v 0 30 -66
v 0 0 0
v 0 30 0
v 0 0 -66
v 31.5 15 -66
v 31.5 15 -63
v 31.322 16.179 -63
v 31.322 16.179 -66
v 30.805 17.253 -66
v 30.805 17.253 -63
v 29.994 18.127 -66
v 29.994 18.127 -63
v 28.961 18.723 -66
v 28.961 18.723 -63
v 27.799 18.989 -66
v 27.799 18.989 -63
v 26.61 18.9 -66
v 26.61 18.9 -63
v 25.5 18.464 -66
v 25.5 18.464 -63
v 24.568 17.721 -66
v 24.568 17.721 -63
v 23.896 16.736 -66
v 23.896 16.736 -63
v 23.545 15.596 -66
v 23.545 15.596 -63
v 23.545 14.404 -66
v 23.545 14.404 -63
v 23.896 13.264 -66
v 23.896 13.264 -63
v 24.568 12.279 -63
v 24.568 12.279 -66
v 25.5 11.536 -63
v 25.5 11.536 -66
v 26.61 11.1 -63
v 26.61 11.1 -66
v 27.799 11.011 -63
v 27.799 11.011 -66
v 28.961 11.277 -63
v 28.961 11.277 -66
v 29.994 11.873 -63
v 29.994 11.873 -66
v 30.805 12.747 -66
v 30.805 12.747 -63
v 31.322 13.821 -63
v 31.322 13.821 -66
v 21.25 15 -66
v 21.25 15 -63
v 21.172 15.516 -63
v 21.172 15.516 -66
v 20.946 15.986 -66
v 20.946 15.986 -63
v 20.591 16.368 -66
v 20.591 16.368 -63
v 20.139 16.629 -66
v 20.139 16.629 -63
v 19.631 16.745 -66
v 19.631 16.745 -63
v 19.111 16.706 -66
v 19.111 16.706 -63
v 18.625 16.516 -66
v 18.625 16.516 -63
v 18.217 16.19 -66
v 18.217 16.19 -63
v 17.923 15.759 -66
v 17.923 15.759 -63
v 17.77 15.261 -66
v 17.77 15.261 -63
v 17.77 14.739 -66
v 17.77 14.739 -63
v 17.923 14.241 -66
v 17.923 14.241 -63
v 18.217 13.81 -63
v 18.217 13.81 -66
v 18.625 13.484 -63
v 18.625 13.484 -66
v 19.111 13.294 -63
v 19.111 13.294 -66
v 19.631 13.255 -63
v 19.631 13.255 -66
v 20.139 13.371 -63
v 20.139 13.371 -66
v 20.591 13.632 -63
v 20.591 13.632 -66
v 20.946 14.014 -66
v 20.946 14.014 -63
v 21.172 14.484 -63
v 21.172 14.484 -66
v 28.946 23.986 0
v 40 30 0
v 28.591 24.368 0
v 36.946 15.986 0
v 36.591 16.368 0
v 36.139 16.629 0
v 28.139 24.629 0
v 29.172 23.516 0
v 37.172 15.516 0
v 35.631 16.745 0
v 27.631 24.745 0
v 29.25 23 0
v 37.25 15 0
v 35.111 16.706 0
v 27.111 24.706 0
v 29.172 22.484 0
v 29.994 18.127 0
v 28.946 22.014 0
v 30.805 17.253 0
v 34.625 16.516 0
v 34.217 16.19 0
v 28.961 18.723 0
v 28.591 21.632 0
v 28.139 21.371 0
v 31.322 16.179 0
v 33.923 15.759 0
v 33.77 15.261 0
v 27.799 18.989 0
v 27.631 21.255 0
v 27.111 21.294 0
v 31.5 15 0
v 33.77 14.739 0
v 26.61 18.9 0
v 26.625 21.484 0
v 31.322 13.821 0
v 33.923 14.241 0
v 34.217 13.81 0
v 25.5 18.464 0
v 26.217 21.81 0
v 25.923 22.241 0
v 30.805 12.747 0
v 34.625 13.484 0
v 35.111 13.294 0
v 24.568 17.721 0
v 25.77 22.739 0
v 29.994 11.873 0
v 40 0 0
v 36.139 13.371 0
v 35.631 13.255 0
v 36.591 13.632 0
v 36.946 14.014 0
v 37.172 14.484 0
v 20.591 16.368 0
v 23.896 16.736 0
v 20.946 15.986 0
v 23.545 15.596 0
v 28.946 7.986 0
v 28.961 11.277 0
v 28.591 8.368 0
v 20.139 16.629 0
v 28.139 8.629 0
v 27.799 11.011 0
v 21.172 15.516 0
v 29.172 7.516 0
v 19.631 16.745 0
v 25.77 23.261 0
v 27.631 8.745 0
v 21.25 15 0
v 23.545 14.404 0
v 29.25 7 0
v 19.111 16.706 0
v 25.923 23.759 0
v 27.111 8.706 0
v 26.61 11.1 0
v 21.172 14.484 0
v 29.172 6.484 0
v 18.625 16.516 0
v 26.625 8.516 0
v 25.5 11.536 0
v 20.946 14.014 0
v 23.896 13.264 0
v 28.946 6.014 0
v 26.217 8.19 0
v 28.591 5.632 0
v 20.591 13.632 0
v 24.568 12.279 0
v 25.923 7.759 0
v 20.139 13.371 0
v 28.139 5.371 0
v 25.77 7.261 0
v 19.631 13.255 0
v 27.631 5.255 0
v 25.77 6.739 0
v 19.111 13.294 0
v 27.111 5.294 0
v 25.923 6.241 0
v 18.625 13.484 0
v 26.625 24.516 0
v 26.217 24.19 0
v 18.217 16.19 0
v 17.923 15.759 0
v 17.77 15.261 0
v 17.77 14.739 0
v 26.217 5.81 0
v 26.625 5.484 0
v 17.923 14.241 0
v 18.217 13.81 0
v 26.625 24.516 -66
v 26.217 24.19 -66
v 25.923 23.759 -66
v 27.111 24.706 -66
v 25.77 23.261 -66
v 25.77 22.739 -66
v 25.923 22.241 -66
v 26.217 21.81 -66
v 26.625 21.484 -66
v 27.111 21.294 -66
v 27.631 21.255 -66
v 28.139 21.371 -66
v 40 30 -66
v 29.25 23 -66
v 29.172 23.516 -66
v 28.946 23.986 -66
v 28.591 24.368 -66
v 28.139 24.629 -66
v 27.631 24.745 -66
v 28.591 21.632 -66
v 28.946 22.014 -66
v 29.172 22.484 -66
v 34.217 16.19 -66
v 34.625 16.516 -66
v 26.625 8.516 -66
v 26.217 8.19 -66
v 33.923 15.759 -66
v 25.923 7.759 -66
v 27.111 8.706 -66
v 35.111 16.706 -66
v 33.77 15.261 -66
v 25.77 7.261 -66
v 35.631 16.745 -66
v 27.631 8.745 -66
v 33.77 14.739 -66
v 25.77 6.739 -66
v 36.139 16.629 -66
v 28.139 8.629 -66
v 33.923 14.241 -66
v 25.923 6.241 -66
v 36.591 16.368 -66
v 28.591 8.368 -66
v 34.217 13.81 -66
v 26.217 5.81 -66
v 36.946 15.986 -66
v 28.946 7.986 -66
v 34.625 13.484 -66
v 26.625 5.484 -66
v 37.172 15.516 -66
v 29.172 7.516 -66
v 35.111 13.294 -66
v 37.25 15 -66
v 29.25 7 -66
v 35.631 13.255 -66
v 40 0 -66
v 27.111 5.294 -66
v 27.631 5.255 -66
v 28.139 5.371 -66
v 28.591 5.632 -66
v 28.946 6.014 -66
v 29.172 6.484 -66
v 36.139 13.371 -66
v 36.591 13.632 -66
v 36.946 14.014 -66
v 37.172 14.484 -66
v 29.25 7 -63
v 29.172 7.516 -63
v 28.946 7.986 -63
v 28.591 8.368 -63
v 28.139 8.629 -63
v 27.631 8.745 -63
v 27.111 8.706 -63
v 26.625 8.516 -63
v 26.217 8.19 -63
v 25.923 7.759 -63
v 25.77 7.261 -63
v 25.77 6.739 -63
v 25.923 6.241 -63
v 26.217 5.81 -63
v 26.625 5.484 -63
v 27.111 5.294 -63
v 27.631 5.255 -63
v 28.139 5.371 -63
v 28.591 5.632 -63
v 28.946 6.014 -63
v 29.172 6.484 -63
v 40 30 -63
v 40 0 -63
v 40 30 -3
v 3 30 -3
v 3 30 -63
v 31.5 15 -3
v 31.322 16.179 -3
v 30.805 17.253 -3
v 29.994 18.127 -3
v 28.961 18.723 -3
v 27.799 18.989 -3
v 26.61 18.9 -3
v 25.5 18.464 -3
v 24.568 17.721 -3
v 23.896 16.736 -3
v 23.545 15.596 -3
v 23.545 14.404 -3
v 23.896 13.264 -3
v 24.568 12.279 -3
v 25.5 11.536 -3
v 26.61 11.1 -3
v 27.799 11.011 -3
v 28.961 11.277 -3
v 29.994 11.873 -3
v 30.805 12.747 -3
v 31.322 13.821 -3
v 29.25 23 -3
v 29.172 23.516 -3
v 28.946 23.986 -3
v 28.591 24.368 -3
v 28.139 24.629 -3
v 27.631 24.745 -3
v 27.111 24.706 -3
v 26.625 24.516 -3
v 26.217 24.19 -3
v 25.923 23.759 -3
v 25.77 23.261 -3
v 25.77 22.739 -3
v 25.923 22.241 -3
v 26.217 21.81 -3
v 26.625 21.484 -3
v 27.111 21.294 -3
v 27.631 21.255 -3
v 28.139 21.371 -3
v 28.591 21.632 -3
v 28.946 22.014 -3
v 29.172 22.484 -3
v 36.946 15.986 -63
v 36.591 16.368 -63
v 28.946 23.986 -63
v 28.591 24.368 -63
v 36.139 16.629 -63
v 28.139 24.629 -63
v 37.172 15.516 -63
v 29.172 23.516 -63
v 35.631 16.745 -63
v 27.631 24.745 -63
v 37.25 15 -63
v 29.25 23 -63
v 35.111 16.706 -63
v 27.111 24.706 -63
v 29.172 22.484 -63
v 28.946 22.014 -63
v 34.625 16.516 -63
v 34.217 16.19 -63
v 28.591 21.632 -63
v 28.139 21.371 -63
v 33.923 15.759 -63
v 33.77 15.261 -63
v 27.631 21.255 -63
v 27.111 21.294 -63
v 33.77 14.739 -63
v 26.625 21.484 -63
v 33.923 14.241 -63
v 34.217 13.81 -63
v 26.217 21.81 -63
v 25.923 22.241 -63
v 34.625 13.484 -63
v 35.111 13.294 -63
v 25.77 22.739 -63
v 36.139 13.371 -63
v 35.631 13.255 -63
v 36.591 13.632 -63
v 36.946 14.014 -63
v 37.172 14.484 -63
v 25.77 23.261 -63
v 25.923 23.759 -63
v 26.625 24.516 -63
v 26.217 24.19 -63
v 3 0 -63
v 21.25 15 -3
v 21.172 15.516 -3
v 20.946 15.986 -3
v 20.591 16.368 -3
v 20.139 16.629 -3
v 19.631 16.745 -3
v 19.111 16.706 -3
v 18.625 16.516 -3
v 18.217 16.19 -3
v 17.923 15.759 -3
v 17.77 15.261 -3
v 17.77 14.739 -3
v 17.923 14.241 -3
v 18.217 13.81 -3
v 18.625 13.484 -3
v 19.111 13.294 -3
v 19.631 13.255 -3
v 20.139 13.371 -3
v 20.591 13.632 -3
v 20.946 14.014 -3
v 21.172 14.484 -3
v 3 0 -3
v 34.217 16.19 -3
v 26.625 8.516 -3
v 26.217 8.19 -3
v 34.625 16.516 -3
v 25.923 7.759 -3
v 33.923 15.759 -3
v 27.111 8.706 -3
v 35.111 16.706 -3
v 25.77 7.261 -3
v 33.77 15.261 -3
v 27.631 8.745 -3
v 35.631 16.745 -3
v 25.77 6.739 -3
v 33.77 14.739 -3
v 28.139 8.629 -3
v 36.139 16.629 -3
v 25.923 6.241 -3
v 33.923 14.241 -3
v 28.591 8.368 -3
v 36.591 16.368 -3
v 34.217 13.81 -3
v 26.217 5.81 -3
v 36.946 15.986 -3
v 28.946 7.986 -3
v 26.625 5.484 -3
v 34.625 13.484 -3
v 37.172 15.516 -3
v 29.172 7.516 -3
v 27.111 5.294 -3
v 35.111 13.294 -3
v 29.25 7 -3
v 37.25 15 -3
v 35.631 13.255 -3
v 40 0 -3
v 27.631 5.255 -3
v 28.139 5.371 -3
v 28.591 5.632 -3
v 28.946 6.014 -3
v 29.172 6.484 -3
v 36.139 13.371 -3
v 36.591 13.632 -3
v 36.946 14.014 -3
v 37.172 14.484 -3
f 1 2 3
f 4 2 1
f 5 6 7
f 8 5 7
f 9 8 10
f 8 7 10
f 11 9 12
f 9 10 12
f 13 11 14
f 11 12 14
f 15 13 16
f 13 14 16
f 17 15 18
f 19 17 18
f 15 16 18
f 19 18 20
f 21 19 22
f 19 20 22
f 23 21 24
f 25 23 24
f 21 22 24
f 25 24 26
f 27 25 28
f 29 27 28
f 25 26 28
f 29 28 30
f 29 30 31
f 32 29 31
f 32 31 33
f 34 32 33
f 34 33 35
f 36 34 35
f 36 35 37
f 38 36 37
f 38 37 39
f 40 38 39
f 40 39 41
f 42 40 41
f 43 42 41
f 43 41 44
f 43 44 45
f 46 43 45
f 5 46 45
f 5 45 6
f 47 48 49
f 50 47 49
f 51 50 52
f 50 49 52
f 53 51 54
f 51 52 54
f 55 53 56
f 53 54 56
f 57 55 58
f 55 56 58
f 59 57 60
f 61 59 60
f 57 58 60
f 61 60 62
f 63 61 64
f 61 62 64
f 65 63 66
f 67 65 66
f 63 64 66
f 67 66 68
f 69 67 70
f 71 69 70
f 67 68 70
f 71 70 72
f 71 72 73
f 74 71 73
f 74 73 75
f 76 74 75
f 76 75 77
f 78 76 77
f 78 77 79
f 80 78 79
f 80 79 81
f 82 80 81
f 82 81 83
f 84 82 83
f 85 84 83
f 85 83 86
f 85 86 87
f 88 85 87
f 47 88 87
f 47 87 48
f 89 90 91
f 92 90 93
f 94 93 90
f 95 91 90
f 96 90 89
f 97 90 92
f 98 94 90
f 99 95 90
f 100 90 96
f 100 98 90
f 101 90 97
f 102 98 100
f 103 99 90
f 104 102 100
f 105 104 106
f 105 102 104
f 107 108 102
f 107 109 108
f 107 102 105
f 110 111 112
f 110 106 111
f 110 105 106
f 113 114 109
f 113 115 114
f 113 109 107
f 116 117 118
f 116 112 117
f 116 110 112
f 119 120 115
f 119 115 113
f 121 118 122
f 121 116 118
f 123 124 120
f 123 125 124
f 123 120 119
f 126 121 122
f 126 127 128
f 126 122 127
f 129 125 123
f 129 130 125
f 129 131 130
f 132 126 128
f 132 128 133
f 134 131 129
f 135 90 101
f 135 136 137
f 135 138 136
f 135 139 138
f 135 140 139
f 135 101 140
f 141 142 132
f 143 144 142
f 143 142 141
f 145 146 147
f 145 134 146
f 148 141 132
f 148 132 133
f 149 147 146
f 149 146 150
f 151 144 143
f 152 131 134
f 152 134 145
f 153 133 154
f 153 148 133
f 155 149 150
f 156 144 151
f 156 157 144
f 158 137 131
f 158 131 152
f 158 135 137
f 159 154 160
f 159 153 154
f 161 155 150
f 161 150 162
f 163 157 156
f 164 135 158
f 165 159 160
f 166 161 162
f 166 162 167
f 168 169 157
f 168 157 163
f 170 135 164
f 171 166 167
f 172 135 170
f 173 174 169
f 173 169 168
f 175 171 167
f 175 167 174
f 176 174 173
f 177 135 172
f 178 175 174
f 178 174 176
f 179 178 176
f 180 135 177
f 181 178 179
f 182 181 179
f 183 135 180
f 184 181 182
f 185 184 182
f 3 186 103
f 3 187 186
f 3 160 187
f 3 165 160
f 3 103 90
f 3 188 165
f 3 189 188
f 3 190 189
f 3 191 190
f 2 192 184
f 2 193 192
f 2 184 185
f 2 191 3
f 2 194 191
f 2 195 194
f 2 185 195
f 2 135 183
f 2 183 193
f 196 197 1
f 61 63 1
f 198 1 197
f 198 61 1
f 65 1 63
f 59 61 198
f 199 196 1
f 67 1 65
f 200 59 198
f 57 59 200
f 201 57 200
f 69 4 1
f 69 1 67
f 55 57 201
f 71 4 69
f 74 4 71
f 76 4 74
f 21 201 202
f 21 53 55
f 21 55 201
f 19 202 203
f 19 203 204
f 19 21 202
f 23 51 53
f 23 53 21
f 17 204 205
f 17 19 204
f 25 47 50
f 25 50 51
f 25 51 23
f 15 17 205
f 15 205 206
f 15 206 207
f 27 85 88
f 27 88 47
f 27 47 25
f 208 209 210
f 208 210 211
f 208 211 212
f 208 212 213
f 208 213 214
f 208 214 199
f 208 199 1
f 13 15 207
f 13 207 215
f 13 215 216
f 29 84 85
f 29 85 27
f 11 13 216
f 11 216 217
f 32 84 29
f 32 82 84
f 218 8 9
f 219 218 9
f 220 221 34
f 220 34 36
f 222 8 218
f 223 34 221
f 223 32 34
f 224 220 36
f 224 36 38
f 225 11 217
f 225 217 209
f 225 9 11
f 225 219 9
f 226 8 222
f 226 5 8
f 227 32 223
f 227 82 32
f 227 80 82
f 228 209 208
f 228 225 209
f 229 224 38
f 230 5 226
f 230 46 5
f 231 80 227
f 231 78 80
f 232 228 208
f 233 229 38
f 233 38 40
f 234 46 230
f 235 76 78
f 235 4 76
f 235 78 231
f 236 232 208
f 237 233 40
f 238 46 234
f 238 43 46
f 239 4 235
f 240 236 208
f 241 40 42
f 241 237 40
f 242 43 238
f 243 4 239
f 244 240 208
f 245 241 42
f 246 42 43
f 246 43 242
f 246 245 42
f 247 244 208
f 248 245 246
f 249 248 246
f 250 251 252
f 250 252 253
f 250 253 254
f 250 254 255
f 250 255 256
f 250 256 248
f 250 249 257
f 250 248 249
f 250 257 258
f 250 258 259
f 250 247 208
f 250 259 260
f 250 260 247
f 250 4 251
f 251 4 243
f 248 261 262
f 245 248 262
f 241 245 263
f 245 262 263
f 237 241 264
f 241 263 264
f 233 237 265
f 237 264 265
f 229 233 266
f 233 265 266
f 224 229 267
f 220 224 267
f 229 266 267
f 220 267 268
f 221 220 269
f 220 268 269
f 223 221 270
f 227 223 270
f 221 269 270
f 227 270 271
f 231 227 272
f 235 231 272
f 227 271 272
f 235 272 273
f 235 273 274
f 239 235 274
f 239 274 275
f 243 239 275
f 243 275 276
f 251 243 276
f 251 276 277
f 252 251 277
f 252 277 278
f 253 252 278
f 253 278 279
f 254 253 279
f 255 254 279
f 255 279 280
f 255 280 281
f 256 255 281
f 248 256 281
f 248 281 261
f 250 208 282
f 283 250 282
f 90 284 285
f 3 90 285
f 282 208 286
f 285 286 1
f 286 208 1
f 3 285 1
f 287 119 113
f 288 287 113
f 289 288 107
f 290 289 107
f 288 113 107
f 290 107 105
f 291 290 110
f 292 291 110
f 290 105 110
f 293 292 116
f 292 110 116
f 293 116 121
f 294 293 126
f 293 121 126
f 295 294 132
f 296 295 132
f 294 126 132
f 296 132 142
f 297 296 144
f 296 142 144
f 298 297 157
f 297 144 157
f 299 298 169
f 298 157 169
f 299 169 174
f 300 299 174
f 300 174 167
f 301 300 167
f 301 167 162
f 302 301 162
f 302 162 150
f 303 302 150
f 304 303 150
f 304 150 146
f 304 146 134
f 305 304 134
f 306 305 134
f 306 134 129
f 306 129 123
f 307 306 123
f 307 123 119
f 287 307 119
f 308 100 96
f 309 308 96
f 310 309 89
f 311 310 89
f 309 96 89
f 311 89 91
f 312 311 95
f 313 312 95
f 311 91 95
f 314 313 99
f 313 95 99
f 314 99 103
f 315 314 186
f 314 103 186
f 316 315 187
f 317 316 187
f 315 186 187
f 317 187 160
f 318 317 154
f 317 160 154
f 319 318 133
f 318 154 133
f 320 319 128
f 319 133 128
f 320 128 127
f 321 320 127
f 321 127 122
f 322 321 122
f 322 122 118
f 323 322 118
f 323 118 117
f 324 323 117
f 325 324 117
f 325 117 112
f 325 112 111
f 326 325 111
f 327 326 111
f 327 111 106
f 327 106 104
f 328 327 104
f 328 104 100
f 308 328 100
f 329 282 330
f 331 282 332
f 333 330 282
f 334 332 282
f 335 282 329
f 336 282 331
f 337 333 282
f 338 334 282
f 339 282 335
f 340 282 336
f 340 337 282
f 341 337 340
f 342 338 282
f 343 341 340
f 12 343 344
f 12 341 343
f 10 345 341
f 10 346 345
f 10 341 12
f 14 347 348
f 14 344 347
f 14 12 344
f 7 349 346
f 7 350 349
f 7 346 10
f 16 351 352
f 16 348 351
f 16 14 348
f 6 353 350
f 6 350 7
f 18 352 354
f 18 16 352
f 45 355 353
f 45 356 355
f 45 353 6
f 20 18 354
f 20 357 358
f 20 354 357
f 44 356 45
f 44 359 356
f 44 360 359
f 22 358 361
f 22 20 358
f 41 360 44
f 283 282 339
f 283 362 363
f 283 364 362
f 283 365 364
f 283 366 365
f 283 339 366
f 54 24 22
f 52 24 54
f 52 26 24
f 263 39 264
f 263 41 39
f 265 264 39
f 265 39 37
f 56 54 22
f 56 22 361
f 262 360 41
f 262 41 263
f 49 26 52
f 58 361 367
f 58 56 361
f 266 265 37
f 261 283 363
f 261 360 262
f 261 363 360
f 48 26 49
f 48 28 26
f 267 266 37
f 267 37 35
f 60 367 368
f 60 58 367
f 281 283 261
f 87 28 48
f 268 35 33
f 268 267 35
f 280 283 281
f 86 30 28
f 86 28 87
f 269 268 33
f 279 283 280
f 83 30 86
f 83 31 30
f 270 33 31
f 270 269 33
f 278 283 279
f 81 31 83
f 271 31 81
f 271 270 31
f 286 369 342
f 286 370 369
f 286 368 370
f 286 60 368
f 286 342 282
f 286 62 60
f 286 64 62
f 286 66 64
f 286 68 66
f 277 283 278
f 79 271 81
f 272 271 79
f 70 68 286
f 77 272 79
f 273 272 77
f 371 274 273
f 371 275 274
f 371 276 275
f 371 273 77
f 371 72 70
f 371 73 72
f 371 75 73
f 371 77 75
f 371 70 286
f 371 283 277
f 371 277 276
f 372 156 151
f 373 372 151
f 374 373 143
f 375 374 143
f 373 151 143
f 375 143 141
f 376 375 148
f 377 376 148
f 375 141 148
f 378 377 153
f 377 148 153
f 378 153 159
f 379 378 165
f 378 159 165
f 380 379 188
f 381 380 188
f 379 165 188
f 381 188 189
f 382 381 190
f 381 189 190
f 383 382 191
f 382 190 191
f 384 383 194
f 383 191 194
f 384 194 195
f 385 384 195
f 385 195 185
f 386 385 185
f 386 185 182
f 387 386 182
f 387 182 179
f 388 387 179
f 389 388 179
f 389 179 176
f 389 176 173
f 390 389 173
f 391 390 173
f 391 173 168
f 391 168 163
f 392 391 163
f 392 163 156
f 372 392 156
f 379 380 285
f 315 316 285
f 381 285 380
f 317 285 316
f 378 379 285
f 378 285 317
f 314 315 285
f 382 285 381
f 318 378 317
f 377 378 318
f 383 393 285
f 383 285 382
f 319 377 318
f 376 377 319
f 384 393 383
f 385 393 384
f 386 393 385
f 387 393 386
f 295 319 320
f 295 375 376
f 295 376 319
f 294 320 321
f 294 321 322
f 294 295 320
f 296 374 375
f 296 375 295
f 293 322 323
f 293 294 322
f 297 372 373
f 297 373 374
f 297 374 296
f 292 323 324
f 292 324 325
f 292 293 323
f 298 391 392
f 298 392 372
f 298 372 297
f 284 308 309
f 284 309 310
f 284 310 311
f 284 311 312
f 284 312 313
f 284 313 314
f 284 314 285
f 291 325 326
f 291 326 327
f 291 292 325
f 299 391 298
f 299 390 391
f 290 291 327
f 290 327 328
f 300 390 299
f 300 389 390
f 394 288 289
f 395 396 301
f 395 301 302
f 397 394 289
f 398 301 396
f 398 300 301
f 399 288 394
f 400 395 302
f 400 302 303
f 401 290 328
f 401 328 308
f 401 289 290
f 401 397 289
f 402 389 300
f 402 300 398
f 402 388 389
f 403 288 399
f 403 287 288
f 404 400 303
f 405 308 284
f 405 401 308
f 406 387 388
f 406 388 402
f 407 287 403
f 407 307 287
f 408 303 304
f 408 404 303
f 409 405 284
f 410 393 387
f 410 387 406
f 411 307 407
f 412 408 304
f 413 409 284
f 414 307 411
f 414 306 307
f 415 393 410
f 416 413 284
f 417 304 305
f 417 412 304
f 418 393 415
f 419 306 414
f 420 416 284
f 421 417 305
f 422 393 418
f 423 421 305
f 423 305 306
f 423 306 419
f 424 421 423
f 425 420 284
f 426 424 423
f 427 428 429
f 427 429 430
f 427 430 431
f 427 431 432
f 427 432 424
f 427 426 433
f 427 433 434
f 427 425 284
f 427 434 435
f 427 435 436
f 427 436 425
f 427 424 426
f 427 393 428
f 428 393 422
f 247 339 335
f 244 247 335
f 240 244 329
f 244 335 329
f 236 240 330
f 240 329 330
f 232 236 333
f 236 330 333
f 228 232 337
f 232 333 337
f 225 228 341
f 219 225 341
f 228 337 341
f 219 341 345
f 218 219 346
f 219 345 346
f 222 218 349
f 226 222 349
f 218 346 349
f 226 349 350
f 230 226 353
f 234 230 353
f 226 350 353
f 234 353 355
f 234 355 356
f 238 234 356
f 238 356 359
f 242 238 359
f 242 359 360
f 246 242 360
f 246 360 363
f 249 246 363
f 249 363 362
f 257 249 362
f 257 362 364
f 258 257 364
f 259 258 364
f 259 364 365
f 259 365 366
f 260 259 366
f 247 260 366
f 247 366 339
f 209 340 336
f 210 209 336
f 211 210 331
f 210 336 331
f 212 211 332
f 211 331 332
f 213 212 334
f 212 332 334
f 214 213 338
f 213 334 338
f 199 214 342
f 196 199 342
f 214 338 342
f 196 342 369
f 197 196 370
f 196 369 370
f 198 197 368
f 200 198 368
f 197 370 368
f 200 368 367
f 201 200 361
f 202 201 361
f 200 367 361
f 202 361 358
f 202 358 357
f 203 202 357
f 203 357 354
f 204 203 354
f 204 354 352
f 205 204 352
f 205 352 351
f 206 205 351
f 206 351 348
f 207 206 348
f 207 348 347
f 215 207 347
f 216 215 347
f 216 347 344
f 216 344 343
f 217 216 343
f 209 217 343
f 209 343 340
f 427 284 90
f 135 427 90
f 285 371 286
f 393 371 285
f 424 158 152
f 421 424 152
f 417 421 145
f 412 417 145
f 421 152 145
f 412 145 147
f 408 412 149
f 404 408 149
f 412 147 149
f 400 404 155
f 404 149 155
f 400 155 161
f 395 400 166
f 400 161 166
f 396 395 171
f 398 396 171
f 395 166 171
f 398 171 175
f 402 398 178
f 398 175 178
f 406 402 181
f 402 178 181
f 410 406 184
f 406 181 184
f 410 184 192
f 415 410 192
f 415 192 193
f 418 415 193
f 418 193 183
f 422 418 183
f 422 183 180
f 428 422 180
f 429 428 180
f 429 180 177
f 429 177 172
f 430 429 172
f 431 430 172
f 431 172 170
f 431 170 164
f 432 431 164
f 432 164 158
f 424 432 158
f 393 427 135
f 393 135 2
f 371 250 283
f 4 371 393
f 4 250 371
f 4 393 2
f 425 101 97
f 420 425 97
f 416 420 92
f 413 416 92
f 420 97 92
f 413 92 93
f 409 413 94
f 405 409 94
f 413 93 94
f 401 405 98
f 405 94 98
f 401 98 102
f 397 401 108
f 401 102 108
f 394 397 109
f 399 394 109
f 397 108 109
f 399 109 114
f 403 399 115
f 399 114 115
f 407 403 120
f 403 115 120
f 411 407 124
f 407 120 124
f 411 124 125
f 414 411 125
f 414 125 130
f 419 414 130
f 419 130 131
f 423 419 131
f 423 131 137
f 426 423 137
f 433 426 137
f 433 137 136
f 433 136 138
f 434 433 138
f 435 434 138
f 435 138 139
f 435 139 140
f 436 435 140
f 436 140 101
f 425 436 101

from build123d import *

# Parameters (mm, degrees)
BOSS_EXTRUDE1_DEPTH = 30
SKETCH2_R           = 4
SKETCH2_R_2         = 1.75
CUT_EXTRUDE1_DEPTH  = 83.800966178


with BuildPart() as part:
    # Sketch1 → Boss-Extrude1 (new body)
    with BuildSketch(Plane(origin=(0, 0, 0), x_dir=(1, 0, 0), z_dir=(0, 1, 0))):
        Polygon((0, 0), (0, 66), (40, 66), (40, 63), (3, 63), (3, 3), (40, 3), (40, 0), align=None)
    extrude(amount=BOSS_EXTRUDE1_DEPTH)

    # Sketch2 → Cut-Extrude1 (cut, through all)
    with BuildSketch(Plane.XY):
        with Locations((27.5, 15)):
            Circle(SKETCH2_R)
        with Locations((19.5, 15)):
            Circle(SKETCH2_R_2)
        with Locations((27.5, 23)):
            Circle(SKETCH2_R_2)
        with Locations((35.5, 15)):
            Circle(SKETCH2_R_2)
        with Locations((27.5, 7)):
            Circle(SKETCH2_R_2)
    extrude(amount=-CUT_EXTRUDE1_DEPTH, mode=Mode.SUBTRACT)


solid = part.part
